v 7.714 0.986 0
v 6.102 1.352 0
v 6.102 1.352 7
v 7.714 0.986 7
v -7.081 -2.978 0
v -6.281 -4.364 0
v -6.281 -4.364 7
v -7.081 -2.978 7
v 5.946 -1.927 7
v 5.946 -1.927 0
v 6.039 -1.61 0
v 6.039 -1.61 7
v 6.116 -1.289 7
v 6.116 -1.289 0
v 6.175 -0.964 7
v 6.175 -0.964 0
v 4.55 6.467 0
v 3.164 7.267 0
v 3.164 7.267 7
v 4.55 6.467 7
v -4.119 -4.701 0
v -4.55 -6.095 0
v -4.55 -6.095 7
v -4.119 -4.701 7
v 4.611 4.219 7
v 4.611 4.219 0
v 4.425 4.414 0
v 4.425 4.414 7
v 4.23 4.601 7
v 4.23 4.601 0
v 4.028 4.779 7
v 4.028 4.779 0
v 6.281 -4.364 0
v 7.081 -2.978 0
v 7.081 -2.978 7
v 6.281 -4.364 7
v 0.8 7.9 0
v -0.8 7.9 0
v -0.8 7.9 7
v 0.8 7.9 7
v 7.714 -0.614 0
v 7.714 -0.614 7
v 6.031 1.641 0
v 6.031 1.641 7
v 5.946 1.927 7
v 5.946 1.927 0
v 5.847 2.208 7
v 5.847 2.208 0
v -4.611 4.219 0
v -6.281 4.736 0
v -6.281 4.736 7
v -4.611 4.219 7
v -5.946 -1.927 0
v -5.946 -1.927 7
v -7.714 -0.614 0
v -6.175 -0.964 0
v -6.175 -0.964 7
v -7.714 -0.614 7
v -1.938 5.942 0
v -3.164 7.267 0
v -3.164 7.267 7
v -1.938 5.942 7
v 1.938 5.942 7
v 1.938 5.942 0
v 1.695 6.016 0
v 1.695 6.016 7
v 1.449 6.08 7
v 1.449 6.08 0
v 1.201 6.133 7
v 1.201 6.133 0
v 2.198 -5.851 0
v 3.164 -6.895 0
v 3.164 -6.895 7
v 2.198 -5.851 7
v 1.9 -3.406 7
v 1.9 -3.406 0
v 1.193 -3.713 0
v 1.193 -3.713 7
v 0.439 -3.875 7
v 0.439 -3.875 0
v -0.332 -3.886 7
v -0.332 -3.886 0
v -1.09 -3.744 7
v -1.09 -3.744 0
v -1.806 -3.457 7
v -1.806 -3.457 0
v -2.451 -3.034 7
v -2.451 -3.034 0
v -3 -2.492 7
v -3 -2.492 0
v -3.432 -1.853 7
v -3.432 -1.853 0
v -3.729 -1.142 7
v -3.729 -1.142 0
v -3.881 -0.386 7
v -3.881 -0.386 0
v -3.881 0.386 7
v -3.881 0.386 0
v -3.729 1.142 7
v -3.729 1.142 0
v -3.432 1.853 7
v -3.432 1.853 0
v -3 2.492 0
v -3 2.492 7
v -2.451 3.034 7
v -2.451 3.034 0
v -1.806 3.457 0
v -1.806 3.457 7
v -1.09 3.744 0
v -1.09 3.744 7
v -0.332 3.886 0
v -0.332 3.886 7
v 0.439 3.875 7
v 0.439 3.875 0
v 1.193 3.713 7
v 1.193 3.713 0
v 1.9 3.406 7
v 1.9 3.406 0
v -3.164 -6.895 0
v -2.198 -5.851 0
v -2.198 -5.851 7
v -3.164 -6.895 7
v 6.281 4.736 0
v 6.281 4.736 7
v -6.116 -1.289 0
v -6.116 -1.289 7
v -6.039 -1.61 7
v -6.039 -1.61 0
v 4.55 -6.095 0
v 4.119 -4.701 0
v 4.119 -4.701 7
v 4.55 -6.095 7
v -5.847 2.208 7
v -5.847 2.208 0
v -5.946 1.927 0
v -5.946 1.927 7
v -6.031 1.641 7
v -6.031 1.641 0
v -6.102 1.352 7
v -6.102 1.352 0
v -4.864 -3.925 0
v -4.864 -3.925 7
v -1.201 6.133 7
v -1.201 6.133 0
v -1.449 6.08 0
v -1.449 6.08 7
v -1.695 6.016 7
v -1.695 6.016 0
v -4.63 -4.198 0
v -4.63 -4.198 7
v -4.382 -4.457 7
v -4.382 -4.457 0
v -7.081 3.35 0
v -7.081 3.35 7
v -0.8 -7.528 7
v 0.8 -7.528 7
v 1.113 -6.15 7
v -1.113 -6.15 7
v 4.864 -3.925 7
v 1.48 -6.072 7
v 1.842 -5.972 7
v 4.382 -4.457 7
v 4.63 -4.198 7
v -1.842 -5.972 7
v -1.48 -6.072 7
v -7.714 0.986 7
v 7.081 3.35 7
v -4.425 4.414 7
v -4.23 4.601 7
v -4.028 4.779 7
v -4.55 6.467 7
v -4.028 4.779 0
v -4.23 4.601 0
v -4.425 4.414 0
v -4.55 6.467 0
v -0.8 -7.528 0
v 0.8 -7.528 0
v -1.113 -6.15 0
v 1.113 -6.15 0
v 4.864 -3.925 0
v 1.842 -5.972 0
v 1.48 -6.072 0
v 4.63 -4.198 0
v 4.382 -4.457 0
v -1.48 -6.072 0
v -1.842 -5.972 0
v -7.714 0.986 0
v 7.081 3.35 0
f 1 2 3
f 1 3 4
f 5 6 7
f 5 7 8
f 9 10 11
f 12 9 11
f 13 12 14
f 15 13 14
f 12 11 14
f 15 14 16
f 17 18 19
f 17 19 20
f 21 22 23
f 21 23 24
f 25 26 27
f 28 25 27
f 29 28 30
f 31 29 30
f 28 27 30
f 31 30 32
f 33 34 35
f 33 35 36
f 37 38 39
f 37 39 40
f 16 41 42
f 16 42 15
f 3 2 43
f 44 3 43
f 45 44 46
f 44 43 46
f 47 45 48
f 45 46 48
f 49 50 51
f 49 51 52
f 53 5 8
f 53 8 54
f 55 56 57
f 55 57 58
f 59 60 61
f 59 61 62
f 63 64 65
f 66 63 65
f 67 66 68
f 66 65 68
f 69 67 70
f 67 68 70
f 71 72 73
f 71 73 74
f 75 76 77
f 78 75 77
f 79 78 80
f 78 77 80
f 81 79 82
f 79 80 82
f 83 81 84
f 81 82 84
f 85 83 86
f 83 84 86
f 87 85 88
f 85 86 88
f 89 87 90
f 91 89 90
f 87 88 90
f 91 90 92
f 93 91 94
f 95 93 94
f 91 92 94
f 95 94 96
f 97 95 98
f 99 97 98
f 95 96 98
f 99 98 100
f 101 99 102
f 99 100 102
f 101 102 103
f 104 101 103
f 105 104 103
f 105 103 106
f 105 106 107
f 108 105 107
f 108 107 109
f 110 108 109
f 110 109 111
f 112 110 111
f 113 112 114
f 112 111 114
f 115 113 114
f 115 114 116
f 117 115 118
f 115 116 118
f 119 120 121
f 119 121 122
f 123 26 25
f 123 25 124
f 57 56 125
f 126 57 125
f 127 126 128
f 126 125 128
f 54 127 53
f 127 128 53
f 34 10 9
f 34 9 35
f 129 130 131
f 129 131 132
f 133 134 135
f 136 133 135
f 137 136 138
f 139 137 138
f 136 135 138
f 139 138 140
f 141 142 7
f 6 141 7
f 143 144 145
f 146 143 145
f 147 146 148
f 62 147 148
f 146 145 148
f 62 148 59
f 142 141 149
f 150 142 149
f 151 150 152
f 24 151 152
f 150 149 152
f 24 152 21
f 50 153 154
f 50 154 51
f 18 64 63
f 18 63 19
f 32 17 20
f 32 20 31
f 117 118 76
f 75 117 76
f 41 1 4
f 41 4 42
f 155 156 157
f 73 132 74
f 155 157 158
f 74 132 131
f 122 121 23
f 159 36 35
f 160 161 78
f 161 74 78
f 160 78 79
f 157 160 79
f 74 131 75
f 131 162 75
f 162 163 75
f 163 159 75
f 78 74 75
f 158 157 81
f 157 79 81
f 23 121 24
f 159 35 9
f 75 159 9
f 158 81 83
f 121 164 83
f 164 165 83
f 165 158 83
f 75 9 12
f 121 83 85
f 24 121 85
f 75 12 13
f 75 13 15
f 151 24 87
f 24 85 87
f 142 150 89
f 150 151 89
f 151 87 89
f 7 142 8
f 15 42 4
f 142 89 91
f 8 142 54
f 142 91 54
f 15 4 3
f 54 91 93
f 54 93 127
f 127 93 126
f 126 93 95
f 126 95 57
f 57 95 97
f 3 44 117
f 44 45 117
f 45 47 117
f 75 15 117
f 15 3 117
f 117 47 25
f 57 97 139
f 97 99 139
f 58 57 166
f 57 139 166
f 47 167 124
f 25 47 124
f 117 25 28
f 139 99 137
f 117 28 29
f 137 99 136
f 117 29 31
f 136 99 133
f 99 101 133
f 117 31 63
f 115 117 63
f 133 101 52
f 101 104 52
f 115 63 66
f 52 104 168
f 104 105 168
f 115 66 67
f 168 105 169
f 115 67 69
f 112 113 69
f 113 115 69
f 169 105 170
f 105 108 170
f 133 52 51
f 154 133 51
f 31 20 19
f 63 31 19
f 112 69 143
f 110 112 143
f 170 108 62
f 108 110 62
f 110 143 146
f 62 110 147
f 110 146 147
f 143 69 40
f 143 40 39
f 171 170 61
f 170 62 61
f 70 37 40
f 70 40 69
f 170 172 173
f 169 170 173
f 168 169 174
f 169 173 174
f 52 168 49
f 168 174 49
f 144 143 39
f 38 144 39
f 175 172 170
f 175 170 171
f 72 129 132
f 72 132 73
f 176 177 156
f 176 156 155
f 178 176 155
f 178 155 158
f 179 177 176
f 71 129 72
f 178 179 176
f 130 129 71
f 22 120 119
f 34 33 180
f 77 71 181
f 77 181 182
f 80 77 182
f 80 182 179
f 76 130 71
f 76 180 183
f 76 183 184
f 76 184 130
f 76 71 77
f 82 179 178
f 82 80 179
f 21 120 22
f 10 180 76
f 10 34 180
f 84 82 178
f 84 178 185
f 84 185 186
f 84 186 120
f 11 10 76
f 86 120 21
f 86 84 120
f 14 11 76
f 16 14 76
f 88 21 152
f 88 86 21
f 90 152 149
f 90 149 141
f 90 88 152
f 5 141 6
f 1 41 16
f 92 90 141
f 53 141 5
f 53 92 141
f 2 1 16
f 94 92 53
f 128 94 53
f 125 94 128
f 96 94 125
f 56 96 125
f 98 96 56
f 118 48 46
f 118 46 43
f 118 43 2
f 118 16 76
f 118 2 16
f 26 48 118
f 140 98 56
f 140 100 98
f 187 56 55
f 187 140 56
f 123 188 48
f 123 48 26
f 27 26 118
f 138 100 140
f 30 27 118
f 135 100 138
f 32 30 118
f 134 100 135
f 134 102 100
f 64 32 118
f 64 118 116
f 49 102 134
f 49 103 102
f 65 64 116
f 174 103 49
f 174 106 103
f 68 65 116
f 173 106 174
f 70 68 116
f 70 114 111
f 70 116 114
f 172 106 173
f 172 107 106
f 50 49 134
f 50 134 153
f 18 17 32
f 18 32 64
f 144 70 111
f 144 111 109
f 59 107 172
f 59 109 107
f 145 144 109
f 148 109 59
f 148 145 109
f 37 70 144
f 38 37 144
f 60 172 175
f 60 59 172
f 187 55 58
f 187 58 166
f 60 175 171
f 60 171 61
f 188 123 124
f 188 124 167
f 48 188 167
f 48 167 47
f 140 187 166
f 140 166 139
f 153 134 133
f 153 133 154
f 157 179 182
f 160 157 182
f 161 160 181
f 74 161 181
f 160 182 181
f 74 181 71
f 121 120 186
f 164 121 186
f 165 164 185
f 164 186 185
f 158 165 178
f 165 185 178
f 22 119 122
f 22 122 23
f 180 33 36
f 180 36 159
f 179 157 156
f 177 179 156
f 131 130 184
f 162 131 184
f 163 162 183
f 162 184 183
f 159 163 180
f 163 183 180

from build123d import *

# Parameters (mm, degrees)
SKETCH1_R           = 6.25
BOSS_EXTRUDE1_DEPTH = 7
BOSS_EXTRUDE2_DEPTH = 7
CIRPATTERN1_COUNT   = 12
CUT_EXTRUDE1_DEPTH  = 7


with BuildPart() as part:
    # Sketch1 → Boss-Extrude1 (new body)
    with BuildSketch(Plane.XY):
        with Locations(Location((0, 0, 0), (0, 0, 180))):
            Circle(SKETCH1_R)
    extrude(amount=BOSS_EXTRUDE1_DEPTH)

    # Sketch3 → Boss-Extrude2 (add)
    with BuildSketch(Plane.XY):
        Polygon((-0.8, 7.9), (0.8, 7.9), (1.3, 5.7), (-1.3, 5.7), align=None)
    boss_extrude2 = extrude(amount=BOSS_EXTRUDE2_DEPTH)

    # CirPattern1: Boss-Extrude2 ×12 about axis
    cirpattern1_axis = Axis((0, 0.185968122, 0), (0, 0, 1))
    for i in range(1, CIRPATTERN1_COUNT):
        add(boss_extrude2.rotate(cirpattern1_axis, i * 360 / CIRPATTERN1_COUNT))

    # Sketch4 → Cut-Extrude1 (cut)
    with BuildSketch(Plane.XY):
        with BuildLine():
            Line((1.9, 3.405877273), (1.9, -3.405877273))
            ThreePointArc((1.9, -3.405877273), (-3.9, 0), (1.9, 3.405877273))
        make_face()
    extrude(amount=CUT_EXTRUDE1_DEPTH, mode=Mode.SUBTRACT)


solid = part.part
